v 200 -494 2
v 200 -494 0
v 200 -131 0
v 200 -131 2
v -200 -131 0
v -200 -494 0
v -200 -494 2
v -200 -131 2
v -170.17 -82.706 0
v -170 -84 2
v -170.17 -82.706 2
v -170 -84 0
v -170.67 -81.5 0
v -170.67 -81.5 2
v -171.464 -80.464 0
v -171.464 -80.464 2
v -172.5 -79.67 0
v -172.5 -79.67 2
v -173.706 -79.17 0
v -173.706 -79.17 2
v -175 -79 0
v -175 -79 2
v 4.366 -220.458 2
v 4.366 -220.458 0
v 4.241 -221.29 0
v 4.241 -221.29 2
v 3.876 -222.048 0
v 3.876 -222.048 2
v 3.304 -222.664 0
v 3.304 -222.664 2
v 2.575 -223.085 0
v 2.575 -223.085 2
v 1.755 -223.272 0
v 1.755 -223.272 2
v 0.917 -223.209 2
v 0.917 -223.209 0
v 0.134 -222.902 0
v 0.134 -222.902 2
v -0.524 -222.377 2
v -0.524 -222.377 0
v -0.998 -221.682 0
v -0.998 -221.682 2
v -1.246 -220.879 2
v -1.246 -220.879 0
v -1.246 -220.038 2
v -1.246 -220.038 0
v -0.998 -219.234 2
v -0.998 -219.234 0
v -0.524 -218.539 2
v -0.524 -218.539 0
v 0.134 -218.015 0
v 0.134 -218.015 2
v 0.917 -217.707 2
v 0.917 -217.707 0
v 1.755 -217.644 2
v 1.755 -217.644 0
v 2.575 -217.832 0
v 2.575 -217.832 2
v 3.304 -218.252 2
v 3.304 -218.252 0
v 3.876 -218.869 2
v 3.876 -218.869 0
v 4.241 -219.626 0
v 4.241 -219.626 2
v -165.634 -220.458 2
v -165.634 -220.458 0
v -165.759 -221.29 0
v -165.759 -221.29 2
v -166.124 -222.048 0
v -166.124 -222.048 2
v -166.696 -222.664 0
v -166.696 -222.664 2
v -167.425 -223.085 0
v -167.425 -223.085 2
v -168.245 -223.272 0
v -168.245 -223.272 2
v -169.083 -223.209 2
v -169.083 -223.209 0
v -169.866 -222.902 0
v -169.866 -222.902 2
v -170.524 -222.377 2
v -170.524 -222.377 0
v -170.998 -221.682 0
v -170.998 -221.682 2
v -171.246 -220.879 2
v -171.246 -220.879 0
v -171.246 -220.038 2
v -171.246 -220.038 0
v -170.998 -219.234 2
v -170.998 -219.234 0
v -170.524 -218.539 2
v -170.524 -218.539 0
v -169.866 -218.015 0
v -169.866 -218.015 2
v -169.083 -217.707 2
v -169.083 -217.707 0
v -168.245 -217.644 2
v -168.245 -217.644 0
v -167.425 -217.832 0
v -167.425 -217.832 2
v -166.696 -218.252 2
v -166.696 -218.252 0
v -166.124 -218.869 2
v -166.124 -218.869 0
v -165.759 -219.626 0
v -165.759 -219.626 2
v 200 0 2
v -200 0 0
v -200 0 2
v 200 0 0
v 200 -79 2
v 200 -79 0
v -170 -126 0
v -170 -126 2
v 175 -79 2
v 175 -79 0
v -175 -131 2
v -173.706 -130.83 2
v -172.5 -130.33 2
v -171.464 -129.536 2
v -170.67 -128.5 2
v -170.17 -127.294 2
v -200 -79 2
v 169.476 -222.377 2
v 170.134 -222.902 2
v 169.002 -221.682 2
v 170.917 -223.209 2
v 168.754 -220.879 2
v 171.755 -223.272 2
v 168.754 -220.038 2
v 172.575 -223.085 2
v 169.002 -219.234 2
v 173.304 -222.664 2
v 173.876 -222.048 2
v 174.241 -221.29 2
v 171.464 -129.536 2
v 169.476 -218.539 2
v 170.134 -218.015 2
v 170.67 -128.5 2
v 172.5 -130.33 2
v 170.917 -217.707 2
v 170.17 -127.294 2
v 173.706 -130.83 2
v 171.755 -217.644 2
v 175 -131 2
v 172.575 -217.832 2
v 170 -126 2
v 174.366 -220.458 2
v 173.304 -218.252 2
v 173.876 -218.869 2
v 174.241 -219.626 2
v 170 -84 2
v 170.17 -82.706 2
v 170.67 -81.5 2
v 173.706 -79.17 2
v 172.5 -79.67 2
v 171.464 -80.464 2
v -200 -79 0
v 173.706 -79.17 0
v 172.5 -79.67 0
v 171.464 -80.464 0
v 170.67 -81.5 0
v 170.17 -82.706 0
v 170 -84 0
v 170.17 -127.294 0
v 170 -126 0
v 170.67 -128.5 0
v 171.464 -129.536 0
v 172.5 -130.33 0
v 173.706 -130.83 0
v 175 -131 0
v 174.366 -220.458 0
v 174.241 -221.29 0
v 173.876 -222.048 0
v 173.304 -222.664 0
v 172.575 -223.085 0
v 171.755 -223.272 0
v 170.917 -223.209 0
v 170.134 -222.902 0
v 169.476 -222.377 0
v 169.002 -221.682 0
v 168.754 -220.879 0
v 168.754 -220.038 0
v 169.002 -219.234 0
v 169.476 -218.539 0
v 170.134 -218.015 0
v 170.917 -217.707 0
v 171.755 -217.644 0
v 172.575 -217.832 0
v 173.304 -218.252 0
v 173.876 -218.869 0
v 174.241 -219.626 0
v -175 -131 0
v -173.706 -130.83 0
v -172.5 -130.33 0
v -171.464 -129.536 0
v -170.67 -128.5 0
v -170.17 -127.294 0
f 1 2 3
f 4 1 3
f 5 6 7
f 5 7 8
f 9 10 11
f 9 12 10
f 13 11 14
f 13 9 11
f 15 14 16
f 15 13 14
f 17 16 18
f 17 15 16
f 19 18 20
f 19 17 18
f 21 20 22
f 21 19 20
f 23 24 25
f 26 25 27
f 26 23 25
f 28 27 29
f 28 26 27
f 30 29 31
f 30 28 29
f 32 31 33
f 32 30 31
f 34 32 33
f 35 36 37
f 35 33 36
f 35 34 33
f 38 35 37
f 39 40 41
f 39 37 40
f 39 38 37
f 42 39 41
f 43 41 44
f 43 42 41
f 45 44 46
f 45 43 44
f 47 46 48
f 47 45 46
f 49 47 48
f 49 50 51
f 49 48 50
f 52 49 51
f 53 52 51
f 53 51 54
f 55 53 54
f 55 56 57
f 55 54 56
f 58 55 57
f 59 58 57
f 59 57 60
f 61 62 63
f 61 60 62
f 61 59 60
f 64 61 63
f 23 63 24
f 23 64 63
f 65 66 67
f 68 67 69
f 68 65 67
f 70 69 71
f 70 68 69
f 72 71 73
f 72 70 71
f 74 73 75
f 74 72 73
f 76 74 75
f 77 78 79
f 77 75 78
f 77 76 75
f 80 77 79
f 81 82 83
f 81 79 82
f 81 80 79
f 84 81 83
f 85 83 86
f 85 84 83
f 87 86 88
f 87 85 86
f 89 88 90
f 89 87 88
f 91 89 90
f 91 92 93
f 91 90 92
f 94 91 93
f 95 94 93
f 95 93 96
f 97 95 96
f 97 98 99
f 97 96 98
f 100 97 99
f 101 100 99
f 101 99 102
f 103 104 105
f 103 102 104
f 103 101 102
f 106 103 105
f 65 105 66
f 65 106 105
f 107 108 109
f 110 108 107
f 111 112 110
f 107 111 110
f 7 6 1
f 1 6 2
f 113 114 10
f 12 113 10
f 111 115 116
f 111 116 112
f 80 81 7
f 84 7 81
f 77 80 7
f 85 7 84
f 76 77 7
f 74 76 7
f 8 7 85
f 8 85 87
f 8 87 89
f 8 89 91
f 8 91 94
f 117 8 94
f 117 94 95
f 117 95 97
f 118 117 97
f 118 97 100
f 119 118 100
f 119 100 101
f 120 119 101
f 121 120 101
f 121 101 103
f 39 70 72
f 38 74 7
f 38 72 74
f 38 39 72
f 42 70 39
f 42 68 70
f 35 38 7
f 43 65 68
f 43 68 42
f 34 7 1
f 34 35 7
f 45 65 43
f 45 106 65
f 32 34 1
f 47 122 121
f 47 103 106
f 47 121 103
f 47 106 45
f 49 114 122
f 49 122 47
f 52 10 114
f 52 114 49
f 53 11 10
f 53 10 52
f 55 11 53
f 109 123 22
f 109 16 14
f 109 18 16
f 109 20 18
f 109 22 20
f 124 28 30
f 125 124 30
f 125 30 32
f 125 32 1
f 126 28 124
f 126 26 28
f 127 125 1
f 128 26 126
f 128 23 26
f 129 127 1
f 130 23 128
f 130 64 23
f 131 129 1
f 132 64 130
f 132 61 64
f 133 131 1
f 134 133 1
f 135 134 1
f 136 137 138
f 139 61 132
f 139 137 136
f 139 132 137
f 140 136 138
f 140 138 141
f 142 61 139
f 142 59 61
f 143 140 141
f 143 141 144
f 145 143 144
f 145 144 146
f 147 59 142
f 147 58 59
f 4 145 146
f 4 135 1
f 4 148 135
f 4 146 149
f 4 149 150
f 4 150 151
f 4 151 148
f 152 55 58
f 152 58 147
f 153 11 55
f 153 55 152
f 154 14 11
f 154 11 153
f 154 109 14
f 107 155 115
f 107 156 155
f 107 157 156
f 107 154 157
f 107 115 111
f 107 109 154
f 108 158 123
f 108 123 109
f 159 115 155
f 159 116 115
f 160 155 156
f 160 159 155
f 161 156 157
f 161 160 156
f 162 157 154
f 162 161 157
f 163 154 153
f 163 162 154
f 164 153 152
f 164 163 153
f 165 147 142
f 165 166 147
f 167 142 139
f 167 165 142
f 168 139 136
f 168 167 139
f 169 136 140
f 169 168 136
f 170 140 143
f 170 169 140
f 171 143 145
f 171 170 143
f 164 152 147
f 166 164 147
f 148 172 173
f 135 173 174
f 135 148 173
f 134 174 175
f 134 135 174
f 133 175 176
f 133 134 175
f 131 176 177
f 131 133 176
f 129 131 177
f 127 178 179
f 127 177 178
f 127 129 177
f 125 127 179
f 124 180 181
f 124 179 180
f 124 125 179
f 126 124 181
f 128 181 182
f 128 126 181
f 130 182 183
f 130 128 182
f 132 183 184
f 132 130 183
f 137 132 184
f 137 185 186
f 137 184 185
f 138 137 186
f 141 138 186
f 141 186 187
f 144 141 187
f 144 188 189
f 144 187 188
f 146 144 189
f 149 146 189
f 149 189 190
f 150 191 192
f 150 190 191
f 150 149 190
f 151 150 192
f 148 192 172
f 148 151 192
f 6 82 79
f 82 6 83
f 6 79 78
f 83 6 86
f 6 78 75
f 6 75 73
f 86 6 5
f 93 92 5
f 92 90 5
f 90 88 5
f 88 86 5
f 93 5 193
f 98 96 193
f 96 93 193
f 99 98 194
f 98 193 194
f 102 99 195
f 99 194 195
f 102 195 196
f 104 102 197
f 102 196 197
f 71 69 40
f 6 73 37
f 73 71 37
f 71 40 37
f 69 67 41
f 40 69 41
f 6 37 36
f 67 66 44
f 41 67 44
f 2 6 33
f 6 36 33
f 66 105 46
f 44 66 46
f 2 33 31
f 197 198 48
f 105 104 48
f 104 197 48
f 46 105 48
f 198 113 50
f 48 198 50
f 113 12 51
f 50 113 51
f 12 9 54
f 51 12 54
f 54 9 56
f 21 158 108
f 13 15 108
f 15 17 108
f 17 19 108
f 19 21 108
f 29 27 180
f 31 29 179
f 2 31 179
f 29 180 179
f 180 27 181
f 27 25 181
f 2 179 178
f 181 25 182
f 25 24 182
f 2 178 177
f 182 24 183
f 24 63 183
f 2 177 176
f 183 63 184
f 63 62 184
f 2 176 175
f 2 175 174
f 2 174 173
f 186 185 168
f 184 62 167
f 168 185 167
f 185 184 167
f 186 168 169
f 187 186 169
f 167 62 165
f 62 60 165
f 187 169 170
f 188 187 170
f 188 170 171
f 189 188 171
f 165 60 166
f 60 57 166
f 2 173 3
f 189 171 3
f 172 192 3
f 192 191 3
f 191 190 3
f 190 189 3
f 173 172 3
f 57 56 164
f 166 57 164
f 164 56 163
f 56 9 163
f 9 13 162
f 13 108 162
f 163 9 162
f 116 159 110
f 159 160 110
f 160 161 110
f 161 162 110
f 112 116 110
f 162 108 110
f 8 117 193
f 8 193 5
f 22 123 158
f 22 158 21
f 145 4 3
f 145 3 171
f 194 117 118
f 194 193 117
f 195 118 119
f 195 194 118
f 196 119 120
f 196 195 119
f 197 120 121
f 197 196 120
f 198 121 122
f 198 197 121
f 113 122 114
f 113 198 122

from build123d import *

# Parameters (mm, degrees)
SKETCH1_W           = 400
SKETCH1_H           = 494
BOSS_EXTRUDE1_DEPTH = 2
CUT_EXTRUDE3_DEPTH  = 10
FILLET1_R           = 5
SKETCH6_R           = 2.821572875
CUT_EXTRUDE4_DEPTH  = 60


with BuildPart() as part:
    # Sketch1 → Boss-Extrude1 (new body)
    with BuildSketch(Plane.XY):
        with Locations((0, -247)):
            Rectangle(SKETCH1_W, SKETCH1_H)
    extrude(amount=BOSS_EXTRUDE1_DEPTH)

    # Sketch5 → Cut-Extrude3 (cut)
    with BuildSketch(Plane.XY.offset(2)):
        Polygon((-200, -106), (-200, -79), (-170, -79), (-170, -106), (-170, -131), (-200, -131), align=None)
        Polygon((200, -131), (170, -131), (170, -106), (170, -79), (200, -79), (200, -106), align=None)
    extrude(amount=-CUT_EXTRUDE3_DEPTH, mode=Mode.SUBTRACT)

    # Fillet1
    fillet1_edges = [part.edges().sort_by_distance(p)[0] for p in [
        (-170, -79, 1),
        (-170, -131, 1),
        (170, -131, 1),
        (170, -79, 1),
    ]]
    fillet(fillet1_edges, radius=FILLET1_R)

    # Sketch6 → Cut-Extrude4 (cut)
    with BuildSketch(Plane(origin=(1.544513547, -237.458154074, 2), x_dir=(-1, 0, 0), z_dir=(0, 0, -1))):
        with Locations(Location((-170, 17, 0), (0, 0, 180))):
            Circle(SKETCH6_R)
        with Locations(Location((0, 17, 0), (0, 0, 180))):
            Circle(SKETCH6_R)
        with Locations(Location((170, 17, 0), (0, 0, 180))):
            Circle(SKETCH6_R)
    extrude(amount=CUT_EXTRUDE4_DEPTH, mode=Mode.SUBTRACT)


solid = part.part
